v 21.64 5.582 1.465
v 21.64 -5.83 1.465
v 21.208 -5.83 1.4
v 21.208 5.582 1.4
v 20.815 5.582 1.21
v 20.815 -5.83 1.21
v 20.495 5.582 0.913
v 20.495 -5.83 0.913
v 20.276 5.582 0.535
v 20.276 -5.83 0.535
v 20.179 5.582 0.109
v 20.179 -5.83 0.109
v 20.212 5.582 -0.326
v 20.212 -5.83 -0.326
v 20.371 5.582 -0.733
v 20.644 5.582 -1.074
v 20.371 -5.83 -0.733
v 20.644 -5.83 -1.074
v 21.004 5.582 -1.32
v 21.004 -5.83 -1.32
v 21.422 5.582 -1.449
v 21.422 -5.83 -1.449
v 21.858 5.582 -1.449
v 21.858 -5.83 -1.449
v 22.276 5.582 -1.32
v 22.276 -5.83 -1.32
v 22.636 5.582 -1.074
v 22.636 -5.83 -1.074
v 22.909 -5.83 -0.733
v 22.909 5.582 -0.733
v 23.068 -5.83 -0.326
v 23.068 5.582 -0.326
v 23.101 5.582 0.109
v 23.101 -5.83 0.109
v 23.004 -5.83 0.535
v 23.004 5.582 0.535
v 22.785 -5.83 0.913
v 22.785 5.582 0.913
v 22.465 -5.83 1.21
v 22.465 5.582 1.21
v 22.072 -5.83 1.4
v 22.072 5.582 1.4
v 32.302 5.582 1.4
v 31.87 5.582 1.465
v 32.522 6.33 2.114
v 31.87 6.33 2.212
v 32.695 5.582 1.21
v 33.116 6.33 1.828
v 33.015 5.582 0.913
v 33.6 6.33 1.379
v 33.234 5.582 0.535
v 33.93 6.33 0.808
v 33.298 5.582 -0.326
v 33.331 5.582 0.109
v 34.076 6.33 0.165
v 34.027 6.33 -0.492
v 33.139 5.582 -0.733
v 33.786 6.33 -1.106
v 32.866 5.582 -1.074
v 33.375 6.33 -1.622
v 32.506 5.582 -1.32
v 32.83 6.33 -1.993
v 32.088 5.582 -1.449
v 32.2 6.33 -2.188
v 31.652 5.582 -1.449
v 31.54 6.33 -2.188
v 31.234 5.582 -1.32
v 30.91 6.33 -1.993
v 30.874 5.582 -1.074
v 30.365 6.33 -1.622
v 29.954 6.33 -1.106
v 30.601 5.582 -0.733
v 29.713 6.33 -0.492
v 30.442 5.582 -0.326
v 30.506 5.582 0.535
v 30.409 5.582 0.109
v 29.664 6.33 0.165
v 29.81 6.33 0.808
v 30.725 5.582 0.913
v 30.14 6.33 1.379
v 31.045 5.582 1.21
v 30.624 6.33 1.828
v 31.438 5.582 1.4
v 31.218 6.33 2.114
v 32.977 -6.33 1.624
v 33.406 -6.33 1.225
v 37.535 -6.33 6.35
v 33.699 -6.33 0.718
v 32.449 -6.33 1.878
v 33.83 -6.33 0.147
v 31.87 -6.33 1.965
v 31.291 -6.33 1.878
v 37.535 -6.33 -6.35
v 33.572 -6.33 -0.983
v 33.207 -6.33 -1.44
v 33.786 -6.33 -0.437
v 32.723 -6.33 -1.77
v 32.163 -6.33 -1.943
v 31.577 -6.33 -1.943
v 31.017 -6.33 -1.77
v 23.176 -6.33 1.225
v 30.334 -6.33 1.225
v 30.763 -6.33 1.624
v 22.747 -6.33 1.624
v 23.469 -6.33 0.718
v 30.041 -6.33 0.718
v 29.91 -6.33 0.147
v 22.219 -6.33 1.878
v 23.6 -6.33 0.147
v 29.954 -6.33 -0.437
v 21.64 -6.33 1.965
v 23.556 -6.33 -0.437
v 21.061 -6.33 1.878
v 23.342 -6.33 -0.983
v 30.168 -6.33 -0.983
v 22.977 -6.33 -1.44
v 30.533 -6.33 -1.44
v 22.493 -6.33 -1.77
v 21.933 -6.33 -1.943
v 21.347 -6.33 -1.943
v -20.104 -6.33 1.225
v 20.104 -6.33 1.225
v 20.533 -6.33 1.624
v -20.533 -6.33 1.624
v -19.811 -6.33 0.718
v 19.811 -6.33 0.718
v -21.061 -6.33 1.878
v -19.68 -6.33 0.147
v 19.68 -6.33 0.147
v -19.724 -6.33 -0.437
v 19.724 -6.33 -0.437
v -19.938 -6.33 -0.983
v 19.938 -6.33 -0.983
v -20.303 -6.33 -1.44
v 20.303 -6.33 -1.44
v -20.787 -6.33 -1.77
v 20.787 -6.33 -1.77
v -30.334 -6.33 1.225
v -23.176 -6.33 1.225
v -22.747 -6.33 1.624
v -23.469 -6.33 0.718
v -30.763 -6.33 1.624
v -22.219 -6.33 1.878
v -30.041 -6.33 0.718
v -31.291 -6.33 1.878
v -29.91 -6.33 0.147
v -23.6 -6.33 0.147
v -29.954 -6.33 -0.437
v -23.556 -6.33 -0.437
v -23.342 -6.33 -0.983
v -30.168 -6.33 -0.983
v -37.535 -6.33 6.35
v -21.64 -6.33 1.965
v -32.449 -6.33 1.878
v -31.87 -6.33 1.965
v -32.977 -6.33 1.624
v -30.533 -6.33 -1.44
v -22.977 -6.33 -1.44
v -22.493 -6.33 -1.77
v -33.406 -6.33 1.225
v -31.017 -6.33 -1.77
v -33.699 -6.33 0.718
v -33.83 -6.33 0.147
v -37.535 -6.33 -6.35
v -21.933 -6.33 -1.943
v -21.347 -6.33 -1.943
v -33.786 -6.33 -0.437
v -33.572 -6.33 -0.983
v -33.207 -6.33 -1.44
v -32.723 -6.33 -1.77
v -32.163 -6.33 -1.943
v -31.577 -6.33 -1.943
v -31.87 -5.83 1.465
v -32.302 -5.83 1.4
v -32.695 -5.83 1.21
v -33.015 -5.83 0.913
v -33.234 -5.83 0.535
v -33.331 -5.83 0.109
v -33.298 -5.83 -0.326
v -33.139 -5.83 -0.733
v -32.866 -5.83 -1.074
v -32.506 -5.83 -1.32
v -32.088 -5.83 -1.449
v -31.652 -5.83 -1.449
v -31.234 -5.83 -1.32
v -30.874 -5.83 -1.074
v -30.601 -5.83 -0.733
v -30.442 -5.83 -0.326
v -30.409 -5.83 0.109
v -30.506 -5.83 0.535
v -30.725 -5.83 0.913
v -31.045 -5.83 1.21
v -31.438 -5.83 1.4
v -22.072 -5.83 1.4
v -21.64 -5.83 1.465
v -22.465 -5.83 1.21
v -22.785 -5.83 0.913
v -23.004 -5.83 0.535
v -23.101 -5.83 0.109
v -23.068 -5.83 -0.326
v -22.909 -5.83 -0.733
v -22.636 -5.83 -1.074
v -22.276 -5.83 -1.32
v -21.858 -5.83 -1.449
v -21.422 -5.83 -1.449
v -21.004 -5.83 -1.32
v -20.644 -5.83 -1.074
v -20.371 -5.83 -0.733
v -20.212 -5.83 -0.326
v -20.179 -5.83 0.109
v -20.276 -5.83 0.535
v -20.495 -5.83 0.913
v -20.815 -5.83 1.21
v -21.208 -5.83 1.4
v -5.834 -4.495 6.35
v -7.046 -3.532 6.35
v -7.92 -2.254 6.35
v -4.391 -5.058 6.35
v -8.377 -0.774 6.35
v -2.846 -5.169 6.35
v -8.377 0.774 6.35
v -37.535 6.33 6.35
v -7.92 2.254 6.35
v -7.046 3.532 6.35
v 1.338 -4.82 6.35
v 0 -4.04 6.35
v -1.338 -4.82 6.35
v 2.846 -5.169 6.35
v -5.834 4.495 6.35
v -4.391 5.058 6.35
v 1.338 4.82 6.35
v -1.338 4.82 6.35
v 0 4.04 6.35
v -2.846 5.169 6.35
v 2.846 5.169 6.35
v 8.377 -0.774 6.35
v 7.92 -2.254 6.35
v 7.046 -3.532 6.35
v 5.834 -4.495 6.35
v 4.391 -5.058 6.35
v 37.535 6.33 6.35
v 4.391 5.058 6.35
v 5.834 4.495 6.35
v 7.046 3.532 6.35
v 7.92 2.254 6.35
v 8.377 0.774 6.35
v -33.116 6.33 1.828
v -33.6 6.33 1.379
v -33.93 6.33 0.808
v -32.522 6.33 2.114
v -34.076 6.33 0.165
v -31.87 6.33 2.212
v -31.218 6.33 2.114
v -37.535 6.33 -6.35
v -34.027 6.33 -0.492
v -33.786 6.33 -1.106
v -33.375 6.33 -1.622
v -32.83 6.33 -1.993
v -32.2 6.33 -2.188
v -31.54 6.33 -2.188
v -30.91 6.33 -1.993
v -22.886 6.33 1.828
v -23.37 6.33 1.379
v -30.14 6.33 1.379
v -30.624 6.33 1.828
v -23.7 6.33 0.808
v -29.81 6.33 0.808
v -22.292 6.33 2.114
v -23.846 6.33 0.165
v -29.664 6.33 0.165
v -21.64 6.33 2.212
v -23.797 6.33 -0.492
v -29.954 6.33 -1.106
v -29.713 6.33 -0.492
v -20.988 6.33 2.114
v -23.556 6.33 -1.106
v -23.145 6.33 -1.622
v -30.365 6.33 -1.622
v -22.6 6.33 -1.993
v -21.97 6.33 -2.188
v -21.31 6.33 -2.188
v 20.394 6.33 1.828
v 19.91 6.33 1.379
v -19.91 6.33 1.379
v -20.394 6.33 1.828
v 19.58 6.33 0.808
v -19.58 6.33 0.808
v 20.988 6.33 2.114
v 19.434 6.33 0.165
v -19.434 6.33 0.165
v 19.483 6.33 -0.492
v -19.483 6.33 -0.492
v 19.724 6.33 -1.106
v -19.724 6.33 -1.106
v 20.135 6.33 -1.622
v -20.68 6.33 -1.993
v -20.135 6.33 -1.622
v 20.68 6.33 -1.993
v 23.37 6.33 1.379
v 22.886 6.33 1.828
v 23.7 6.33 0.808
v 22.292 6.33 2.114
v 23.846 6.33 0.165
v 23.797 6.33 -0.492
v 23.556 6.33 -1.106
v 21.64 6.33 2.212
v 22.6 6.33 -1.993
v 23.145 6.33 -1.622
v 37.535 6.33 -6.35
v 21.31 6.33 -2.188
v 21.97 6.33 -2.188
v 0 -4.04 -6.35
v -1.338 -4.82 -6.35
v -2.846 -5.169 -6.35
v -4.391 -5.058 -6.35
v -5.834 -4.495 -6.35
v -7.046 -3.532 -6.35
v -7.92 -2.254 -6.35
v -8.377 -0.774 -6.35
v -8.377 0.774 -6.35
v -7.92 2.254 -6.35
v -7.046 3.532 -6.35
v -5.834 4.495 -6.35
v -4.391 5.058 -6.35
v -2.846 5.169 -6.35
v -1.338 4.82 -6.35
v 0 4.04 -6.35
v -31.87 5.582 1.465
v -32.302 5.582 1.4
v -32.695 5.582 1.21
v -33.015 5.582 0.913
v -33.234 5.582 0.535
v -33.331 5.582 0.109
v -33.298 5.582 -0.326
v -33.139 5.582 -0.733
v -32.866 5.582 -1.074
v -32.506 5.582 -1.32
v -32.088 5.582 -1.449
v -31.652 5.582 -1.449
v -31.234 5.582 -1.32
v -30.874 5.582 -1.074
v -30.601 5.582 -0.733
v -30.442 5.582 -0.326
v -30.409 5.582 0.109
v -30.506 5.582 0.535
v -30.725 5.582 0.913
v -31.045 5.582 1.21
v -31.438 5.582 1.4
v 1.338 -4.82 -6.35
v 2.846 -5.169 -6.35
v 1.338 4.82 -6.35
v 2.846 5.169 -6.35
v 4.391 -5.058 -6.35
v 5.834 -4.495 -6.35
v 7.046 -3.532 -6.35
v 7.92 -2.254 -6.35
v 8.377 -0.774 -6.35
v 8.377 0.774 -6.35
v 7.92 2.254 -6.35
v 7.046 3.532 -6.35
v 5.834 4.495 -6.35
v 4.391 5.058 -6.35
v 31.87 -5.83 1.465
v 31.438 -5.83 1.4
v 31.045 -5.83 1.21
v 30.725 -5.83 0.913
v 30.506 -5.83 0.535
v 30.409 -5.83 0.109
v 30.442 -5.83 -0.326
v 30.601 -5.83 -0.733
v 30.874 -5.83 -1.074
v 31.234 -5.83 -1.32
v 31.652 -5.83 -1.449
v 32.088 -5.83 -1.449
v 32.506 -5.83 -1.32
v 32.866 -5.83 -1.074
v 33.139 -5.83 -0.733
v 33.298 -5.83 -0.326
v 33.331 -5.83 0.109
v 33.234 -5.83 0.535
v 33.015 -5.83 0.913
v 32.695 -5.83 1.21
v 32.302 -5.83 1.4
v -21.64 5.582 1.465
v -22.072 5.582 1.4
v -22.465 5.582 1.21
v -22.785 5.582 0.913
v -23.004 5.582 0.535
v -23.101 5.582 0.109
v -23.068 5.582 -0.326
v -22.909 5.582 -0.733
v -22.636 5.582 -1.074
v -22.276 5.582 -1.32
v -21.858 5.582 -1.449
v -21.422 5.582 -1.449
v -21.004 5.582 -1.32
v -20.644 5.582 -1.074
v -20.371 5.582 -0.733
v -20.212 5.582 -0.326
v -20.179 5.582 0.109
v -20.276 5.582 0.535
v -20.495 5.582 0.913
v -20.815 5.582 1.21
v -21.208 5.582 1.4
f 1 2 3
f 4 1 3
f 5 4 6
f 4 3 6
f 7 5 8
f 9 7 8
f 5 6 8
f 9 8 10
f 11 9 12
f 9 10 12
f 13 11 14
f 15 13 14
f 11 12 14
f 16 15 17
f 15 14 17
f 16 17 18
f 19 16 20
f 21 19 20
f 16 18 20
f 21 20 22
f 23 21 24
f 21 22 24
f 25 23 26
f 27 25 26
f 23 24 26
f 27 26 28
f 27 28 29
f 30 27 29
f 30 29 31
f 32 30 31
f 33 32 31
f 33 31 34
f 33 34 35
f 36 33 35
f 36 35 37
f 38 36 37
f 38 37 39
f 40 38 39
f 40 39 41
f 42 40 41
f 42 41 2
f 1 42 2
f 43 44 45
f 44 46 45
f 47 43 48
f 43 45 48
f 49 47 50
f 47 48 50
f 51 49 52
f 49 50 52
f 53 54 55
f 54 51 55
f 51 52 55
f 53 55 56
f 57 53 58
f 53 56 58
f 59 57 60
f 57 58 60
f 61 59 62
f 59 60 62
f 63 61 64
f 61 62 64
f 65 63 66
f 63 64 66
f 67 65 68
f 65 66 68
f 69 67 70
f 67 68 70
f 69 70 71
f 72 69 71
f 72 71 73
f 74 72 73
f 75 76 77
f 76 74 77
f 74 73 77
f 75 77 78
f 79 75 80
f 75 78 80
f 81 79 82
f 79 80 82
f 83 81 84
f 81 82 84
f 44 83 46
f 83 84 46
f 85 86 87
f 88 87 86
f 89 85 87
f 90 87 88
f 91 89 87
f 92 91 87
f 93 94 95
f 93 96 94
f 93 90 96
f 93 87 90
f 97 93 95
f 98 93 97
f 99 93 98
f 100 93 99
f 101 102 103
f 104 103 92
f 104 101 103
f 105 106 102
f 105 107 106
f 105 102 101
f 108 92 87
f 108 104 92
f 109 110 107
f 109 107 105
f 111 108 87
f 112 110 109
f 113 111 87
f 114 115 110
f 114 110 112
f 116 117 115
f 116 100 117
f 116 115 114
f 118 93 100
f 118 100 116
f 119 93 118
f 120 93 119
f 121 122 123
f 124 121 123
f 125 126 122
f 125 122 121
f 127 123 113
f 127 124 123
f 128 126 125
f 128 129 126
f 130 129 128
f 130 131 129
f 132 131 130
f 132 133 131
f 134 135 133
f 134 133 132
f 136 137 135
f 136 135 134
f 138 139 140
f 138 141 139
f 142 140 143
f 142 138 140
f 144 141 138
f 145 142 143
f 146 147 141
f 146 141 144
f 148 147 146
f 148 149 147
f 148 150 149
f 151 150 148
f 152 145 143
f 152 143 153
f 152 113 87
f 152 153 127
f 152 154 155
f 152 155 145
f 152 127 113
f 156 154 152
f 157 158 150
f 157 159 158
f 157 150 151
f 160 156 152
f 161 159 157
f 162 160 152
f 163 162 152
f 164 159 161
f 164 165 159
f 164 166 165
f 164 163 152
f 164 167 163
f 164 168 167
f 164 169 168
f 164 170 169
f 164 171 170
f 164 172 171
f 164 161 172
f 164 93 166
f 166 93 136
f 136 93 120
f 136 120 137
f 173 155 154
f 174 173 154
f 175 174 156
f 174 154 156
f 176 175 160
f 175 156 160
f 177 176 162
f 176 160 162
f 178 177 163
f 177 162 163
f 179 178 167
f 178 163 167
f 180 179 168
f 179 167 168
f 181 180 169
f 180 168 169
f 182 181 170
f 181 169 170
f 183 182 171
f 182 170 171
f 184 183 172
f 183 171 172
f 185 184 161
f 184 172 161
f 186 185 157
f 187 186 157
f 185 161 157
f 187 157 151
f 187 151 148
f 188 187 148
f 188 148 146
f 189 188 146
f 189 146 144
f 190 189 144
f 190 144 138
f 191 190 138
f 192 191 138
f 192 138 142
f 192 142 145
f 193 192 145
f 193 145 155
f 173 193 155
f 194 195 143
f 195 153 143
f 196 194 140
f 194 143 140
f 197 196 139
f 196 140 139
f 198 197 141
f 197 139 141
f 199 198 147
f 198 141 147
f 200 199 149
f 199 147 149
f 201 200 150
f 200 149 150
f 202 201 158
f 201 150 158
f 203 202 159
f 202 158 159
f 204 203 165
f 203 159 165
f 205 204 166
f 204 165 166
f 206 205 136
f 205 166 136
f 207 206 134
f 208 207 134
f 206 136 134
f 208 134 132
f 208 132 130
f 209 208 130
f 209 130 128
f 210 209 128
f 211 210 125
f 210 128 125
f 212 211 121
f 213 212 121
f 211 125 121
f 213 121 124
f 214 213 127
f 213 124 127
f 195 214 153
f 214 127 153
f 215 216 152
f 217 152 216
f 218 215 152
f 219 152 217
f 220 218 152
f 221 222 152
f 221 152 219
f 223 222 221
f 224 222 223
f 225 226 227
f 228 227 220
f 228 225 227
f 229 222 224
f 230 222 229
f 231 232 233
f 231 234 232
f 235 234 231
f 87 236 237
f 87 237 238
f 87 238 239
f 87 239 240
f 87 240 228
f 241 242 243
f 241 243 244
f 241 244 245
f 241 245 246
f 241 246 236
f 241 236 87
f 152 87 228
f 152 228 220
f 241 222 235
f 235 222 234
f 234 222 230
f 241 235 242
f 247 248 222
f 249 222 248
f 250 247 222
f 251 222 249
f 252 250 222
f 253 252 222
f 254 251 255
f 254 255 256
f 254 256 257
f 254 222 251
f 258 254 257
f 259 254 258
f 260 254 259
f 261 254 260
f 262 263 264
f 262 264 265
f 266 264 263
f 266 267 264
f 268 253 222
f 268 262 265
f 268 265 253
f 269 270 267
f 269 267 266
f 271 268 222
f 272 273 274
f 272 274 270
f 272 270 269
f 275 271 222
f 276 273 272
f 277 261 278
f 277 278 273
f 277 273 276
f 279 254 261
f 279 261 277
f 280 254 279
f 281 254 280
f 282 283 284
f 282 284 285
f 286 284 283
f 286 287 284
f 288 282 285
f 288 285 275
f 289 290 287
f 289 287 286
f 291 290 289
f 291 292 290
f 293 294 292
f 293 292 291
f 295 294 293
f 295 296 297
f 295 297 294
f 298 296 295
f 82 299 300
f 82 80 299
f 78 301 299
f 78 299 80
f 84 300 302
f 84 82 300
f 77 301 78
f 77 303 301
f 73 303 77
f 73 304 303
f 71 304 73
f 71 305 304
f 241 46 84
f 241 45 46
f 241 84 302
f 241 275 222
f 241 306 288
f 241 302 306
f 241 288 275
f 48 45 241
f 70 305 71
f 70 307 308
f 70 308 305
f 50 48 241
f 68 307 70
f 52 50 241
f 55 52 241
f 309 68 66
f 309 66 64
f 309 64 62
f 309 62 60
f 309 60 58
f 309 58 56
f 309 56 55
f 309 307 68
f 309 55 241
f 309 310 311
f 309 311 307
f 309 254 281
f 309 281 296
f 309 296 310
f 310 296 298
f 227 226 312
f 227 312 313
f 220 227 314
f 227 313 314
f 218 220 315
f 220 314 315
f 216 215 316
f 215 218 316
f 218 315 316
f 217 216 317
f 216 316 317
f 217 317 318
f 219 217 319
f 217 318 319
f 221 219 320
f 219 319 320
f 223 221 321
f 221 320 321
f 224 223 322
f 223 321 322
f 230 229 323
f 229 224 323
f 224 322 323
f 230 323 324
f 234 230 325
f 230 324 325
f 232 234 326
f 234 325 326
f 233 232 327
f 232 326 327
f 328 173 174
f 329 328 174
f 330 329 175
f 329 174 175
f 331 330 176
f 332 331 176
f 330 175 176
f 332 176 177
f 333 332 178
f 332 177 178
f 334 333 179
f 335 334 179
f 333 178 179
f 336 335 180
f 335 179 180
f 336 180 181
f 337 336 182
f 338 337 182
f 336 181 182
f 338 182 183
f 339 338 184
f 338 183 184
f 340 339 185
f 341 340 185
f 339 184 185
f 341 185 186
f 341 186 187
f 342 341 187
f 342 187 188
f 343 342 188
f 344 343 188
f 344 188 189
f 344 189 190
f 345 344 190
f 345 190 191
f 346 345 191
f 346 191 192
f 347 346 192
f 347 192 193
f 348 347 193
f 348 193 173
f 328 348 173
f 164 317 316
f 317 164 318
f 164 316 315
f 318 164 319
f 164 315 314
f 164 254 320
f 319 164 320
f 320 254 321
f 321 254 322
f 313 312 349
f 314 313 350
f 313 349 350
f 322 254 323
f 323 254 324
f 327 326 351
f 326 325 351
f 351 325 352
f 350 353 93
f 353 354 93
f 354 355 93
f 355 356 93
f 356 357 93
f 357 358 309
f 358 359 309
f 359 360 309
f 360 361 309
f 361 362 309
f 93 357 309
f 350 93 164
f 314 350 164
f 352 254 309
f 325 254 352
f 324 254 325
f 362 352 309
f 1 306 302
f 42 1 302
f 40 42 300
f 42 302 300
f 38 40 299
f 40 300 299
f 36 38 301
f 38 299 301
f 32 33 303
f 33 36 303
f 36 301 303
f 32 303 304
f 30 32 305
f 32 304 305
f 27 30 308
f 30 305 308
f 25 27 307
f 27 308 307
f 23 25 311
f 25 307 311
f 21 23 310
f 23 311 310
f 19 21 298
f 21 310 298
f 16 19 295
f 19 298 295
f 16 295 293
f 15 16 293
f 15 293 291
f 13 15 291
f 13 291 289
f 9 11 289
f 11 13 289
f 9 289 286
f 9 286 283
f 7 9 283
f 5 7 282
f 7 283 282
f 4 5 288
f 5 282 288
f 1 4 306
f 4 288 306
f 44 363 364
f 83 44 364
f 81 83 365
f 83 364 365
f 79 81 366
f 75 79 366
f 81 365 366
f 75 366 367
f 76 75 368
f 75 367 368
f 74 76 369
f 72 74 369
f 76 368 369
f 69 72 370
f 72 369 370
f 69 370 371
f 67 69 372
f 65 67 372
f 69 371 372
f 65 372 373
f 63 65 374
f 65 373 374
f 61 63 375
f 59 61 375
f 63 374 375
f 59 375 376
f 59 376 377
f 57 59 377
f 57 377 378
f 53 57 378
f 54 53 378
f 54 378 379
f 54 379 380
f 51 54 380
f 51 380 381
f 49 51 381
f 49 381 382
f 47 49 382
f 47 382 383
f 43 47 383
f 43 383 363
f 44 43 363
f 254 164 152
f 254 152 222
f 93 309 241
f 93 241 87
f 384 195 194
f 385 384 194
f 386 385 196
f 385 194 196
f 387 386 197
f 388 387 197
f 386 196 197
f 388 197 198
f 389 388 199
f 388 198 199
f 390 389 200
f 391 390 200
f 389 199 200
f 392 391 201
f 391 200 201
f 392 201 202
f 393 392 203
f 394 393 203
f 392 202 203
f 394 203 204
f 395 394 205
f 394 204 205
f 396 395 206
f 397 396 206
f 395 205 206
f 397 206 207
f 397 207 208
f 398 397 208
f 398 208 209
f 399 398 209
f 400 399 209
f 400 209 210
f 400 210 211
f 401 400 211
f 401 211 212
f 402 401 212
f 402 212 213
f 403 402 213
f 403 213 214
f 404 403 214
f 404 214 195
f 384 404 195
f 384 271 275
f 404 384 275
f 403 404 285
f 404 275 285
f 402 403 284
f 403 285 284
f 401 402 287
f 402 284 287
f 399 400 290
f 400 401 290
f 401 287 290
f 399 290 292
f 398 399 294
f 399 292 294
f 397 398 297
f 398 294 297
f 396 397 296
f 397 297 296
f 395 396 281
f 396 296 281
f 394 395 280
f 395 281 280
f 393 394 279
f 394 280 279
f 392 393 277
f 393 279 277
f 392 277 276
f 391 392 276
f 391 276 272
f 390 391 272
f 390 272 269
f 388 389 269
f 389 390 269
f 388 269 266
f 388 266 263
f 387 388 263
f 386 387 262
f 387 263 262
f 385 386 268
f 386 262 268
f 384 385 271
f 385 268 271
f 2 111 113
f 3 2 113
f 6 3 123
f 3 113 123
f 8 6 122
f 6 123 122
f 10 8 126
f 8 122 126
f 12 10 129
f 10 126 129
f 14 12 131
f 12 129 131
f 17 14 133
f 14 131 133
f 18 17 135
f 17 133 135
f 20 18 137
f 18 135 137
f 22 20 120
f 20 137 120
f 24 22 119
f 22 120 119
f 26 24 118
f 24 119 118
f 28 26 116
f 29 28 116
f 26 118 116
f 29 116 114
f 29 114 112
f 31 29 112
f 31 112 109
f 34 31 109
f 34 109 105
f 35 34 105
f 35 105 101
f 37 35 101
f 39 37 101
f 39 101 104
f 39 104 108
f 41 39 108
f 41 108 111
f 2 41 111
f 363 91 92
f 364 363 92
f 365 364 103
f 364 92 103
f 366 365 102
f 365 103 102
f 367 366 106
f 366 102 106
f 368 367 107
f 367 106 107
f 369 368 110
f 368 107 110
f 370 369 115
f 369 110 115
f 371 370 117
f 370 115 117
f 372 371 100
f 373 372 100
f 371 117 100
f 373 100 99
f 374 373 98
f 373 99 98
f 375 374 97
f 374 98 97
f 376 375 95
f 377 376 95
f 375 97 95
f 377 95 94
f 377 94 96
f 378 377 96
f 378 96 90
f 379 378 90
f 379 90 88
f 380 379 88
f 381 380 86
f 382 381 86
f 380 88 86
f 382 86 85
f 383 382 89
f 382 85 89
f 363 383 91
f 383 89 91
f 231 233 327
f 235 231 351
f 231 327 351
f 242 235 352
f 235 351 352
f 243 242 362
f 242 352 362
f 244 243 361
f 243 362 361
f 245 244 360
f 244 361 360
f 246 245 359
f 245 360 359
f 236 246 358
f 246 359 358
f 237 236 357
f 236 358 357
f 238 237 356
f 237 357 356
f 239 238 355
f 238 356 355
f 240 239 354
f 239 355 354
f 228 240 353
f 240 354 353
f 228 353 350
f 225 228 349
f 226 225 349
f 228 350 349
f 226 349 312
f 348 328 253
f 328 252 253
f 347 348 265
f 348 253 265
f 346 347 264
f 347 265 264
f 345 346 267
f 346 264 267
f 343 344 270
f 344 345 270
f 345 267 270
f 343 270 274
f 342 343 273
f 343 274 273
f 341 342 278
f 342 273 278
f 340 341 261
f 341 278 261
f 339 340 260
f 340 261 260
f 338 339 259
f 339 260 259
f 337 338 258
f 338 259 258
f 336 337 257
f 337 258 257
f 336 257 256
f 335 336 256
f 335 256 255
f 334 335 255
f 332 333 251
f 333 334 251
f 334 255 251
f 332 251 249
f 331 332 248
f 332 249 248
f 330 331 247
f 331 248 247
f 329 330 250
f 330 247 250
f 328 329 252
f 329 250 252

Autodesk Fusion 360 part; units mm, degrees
sketch "Sketch1" plane through (0, 0, 0) normal (0, 0, 1) x (1, 0, 0)
  line L0 (-37.535, 6.33) -> (37.535, 6.33)
  line L1 (37.535, 6.33) -> (37.535, -6.33)
  line L2 (37.535, -6.33) -> (-37.535, -6.33)
  line L3 (-37.535, -6.33) -> (-37.535, 6.33)
  circle A0 centre (-3.25, 0) radius 5.185
  line L4 (-8.435, -2.5958) -> (-8.435, 3.4826) construction
  line L5 (0, 2.5) -> (0, 20) construction
  circle A1 centre (3.25, 0) radius 5.185
  point P0 (0, 6.33)
  point P1 (37.535, 0)
  dimension "d1" = 75.07
  dimension "d2" = 12.66
  dimension "d3" = 10.37
  dimension "d5" = 29.1
extrude "Extrude1" add sketch "Sketch1" along normal mid plane 12.7
sketch "Sketch2" plane through (0, 6.33, 0) normal (0, 1, 0) x (-1, 0, 0)
  line L0 (37.535, -6.35) -> (37.535, 6.35)
  line L1 (37.535, 6.35) -> (-37.535, 6.35)
  line L2 (-37.535, 6.35) -> (-37.535, -6.35)
  line L3 (-37.535, -6.35) -> (37.535, -6.35)
  circle A0 centre (31.87, 0) radius 1.765
  circle A1 centre (21.64, 0) radius 1.765
  line L4 (0, 20) -> (0, 2.5)
  circle A2 centre (-21.64, 0) radius 1.765
  circle A3 centre (-31.87, 0) radius 1.765
  point P0 (37.535, 0)
  point P1 (23.405, 0)
  point P2 (30.105, 0)
  point P3 (33.635, 0)
  dimension "d8" = 3.53
  dimension "d9" = 6.7
  dimension "d10" = 3.9
hole "Hole1" at (-31.87, 6.33, 0) at (-21.64, 6.33, 0) at (21.64, 6.33, 0) at (31.87, 6.33, 0) direction (0, -1, 0) diameter 2.93 end through all countersink diameter 4.425 countersink angle 90
chamfer "Chamfer1" distance 0.5 angle 45 4 edges at (-32.3998, -6.33, -1.3659) (-22.1698, -6.33, -1.3659) (21.1102, -6.33, -1.3659) (31.3402, -6.33, -1.3659)
